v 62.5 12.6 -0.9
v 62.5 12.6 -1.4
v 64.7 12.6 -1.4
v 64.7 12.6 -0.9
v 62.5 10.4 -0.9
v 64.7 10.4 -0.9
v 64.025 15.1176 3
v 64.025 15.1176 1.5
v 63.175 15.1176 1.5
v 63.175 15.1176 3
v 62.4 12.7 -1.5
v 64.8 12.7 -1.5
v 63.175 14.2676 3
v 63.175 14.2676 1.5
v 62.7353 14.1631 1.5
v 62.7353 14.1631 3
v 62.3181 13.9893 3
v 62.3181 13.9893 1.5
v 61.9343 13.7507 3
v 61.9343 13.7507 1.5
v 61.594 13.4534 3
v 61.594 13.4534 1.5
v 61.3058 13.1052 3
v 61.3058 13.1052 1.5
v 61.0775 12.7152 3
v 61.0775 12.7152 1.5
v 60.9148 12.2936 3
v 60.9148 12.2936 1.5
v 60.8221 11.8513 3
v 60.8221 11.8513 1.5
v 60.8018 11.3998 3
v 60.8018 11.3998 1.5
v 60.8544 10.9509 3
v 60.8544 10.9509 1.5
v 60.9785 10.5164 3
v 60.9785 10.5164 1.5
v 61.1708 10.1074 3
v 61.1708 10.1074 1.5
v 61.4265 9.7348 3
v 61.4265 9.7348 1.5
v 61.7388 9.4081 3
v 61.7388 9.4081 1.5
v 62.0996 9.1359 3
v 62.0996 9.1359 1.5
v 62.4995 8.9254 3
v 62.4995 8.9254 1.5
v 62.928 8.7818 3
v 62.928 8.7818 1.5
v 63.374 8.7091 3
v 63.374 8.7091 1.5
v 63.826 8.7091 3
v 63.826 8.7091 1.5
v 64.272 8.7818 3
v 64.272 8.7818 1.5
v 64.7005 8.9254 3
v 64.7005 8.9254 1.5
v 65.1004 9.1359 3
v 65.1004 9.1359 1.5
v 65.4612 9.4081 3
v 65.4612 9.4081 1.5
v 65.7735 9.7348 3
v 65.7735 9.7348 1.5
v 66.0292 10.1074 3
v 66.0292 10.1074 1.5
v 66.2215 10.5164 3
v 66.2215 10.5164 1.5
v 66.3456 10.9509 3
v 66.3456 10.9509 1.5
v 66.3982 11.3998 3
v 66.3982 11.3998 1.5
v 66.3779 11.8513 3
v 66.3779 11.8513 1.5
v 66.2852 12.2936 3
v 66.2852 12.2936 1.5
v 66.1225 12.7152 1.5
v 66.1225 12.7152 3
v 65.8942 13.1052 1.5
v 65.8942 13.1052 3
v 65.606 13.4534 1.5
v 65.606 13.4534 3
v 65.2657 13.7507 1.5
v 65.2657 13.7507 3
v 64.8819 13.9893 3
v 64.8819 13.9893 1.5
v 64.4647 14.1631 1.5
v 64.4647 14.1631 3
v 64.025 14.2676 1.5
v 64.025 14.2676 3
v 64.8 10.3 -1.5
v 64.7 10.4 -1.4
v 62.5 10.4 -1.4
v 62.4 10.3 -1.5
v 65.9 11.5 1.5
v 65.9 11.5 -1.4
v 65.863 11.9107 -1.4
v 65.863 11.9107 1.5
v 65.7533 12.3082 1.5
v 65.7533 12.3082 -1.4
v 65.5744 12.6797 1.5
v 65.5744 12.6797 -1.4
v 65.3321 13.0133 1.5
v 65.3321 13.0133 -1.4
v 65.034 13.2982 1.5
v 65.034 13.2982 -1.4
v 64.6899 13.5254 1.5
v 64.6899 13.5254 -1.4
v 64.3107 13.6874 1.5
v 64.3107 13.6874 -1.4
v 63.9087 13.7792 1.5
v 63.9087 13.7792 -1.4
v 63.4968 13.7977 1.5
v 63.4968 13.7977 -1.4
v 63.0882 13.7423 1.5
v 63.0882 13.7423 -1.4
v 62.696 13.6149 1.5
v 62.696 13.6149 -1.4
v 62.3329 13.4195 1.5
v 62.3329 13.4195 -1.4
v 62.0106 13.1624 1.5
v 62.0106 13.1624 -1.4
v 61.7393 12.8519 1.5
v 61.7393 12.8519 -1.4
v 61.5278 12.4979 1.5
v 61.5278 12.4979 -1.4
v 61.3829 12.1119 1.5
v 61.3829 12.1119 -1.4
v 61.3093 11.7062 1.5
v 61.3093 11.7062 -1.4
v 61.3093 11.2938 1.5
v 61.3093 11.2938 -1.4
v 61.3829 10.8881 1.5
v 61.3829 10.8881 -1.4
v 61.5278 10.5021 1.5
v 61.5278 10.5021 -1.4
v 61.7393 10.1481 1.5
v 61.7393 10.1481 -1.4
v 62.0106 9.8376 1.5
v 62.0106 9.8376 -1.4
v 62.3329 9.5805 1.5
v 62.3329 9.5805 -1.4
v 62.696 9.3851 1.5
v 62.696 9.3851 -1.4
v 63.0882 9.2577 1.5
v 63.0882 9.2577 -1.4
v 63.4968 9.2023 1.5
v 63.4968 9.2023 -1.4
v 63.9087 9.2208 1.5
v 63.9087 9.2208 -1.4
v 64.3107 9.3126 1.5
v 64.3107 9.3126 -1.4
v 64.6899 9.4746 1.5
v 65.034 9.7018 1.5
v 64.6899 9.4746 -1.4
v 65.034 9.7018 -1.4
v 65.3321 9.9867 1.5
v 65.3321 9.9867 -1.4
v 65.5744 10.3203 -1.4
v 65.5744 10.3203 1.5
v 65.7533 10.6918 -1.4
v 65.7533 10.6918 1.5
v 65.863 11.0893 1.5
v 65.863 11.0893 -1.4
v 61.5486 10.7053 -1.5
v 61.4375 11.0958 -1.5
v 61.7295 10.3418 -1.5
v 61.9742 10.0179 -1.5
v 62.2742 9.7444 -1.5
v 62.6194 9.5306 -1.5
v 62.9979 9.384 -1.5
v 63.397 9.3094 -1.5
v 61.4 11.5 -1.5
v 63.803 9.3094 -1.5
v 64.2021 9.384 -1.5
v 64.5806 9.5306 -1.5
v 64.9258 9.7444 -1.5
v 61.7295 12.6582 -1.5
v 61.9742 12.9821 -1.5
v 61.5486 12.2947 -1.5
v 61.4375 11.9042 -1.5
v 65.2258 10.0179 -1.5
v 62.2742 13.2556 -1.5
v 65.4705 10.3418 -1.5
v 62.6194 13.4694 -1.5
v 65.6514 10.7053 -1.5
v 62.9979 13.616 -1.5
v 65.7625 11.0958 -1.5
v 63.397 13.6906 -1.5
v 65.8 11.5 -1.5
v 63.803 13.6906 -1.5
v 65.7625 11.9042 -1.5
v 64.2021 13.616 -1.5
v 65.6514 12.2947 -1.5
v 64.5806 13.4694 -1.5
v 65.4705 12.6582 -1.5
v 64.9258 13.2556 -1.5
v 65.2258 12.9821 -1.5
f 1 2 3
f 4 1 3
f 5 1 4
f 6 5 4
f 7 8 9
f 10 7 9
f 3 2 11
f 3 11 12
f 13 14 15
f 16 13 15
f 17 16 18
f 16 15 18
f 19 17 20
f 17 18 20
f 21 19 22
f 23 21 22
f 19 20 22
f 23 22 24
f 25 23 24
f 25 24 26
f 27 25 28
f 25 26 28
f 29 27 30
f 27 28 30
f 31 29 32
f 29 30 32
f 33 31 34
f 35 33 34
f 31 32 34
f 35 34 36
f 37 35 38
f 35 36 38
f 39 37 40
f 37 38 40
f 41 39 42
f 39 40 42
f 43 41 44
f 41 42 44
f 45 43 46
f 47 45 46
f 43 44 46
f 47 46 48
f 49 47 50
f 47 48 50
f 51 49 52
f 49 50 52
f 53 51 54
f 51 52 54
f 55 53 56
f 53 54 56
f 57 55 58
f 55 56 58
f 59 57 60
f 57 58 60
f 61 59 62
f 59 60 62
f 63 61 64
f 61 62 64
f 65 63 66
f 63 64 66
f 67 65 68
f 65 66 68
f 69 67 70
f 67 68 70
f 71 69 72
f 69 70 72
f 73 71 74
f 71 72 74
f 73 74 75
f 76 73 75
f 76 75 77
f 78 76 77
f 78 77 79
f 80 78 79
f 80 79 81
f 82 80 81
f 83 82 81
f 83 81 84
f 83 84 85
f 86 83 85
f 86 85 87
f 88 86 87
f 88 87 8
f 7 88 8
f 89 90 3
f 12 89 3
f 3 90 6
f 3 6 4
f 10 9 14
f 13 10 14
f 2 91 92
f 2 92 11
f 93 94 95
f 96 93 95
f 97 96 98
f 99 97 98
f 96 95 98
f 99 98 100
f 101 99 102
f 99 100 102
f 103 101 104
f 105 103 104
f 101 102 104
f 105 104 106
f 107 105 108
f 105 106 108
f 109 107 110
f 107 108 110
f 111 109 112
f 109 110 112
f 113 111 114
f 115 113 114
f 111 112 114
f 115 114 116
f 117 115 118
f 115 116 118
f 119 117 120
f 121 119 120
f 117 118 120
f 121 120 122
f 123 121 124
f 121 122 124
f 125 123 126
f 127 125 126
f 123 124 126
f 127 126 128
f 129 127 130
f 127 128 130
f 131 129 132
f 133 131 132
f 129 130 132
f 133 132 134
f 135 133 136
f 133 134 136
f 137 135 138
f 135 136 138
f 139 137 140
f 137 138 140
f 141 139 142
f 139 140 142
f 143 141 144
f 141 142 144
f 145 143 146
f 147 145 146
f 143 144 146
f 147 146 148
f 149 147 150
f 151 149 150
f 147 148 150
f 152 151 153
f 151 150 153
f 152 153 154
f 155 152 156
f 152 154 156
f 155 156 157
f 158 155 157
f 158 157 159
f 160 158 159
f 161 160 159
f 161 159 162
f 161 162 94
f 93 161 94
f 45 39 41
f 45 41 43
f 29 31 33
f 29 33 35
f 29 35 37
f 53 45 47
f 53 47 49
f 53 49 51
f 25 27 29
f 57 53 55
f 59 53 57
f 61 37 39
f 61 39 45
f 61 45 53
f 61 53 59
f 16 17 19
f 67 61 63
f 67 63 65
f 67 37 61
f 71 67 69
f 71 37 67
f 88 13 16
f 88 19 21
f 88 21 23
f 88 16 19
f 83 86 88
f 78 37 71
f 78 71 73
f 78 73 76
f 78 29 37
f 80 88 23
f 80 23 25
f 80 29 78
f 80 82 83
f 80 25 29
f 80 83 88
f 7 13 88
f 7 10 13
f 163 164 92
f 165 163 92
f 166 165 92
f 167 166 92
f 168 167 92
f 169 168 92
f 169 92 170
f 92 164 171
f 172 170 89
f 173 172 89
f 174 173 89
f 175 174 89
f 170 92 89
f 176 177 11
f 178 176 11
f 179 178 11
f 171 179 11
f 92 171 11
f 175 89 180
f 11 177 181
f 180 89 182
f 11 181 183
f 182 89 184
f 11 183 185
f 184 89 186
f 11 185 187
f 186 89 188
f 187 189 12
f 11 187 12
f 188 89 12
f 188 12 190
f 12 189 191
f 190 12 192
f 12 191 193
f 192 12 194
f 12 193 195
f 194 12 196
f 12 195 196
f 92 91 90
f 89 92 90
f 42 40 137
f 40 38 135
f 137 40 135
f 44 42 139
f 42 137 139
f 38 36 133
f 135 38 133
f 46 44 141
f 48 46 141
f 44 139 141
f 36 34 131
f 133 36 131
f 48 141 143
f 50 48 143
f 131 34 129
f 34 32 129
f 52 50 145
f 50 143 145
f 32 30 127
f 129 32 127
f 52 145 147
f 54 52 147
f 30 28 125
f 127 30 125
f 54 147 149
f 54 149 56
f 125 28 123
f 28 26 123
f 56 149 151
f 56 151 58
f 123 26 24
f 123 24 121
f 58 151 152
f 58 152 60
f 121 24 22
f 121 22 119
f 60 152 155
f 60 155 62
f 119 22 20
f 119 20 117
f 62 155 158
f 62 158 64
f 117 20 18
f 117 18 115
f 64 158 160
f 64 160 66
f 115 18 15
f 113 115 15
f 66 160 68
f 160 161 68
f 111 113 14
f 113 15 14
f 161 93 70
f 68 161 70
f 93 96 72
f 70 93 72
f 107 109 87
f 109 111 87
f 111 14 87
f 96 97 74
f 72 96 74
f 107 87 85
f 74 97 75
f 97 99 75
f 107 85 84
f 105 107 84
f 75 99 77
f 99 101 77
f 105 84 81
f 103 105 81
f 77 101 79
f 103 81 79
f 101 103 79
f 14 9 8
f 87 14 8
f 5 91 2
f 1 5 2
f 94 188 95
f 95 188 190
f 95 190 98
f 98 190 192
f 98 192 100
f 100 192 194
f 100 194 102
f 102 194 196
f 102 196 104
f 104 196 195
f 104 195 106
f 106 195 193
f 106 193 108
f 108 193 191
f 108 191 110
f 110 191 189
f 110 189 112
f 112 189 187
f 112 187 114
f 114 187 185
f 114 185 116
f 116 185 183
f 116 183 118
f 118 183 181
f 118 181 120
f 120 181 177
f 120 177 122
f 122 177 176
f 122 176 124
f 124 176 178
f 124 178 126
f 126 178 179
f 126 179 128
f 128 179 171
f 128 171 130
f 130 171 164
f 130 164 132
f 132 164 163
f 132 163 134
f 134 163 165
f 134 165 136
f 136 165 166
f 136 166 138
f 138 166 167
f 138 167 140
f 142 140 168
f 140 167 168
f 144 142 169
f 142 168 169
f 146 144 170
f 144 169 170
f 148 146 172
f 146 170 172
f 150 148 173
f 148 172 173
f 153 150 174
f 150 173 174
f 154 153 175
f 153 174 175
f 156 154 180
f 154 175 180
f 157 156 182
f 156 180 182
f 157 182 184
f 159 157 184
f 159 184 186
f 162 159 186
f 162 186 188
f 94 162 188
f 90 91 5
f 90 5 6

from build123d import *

# Parameters (mm, degrees)
SKETCH055_R     = 2.3
PAD038_DEPTH    = 3
PAD039_DEPTH    = 1.5
SKETCH057_W     = 2.2
SKETCH057_H     = 2.2
POCKET010_DEPTH = 0.6
CHAMFER004_SIZE = 0.1


with BuildPart() as part:
    # Sketch055 → Pad038 (new body)
    with BuildSketch(Plane.XY):
        Circle(SKETCH055_R)
    extrude(amount=PAD038_DEPTH)

    # Sketch056 (on Face3 of Pad038) → Pad039 (join)
    with BuildSketch(Plane.XY.offset(3)):
        with BuildLine():
            Line((0.425, 2.767558), (0.425, 3.617558))
            Line((0.425, 3.617558), (-0.425, 3.617558))
            Line((-0.425, 3.617558), (-0.425, 2.767558))
            ThreePointArc((-0.425, 2.767558), (0, -2.8), (0.425, 2.767558))
        make_face()
    extrude(amount=PAD039_DEPTH)

    # Sketch057 → Pocket010 (cut)
    with BuildSketch(Plane.XY):
        Rectangle(SKETCH057_W, SKETCH057_H)
    extrude(amount=POCKET010_DEPTH, mode=Mode.SUBTRACT)

    # Chamfer004
    chamfer004_edges = [part.edges().sort_by_distance(p)[0] for p in [
        (0, 1.1, 0),
        (0, -1.1, 0),
        (1.1, 0, 0),
        (-2.3, 0, 0),
        (-1.1, 0, 0),
    ]]
    chamfer(chamfer004_edges, length=CHAMFER004_SIZE)


with BuildPart() as part_1:
    # Body016 placement: moved
    add(part.part.moved(Location((63.6, 11.5, -1.5))))


solid = part_1.part
